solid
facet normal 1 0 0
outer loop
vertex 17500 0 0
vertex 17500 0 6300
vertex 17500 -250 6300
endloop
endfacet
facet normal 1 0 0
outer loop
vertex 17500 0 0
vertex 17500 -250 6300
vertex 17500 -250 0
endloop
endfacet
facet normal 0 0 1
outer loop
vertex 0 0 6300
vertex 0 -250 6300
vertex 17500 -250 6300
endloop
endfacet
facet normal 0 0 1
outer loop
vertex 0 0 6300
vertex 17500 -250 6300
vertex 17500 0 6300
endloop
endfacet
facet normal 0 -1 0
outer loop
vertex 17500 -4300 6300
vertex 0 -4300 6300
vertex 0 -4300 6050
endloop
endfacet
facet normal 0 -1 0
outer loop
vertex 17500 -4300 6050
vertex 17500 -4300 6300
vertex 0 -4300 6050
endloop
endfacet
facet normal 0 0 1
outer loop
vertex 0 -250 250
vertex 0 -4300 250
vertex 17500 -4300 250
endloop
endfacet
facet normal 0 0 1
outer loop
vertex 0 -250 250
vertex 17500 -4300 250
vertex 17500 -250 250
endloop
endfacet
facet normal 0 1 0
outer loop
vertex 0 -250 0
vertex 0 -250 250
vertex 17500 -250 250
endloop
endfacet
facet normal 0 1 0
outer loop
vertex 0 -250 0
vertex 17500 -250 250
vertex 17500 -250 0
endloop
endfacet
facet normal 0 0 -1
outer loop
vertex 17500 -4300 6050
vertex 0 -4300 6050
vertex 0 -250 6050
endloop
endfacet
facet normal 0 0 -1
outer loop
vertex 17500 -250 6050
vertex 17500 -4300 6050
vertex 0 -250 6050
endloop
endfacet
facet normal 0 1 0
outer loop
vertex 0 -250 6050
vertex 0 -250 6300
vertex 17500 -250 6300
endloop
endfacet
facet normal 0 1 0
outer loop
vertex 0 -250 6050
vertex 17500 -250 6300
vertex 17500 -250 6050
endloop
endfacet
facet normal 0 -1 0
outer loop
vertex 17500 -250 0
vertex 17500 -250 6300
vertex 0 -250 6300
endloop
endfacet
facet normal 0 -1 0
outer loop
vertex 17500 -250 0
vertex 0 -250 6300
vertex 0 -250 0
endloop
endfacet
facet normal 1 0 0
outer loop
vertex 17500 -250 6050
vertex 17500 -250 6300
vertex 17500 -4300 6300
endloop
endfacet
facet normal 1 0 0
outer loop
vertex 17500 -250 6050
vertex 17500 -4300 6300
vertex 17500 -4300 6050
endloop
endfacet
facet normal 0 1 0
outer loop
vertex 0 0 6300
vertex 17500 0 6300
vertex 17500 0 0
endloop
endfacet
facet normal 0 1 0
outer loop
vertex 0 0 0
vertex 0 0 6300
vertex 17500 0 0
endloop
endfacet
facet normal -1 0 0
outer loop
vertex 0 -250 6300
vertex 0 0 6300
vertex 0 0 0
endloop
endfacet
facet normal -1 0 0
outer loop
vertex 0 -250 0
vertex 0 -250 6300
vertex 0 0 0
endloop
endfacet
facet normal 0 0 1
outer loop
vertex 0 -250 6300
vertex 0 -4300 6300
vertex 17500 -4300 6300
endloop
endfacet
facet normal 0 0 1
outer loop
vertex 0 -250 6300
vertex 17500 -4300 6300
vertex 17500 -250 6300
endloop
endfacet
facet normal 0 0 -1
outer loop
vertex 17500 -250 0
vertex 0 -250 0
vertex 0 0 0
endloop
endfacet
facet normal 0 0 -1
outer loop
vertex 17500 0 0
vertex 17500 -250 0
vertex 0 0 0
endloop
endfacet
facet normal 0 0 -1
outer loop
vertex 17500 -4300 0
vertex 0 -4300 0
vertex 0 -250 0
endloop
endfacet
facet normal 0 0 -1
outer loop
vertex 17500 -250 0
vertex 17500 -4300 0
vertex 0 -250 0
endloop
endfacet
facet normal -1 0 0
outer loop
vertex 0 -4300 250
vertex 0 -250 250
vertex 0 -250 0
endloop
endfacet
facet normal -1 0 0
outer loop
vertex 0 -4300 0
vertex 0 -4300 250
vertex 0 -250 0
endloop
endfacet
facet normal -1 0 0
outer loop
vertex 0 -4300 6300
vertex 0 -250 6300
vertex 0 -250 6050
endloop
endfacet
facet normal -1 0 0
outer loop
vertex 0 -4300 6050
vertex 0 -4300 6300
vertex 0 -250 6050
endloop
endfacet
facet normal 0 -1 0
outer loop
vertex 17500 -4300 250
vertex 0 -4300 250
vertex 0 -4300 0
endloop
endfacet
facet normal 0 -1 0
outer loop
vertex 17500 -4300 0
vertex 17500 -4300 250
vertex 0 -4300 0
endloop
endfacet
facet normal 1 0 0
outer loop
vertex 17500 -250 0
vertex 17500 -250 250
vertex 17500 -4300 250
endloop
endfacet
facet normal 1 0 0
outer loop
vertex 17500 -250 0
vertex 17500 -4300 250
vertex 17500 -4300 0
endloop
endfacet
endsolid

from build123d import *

# Parameters (mm, degrees)
SKETCH4_W           = 6300
SKETCH4_H           = 250
BOSS_EXTRUDE4_DEPTH = 17500
SKETCH6_W           = 250
SKETCH6_H           = 4050
BOSS_EXTRUDE5_DEPTH = 17500
SKETCH7_W           = 250
SKETCH7_H           = 4050
BOSS_EXTRUDE6_DEPTH = 17500


with BuildPart() as part:
    # Sketch4 → Boss-Extrude4 (new body)
    with BuildSketch(Plane(origin=(0, 0, 0), x_dir=(0, 0, -1), z_dir=(1, 0, 0))):
        with Locations((-3150, -125)):
            Rectangle(SKETCH4_W, SKETCH4_H)
    extrude(amount=BOSS_EXTRUDE4_DEPTH)


with BuildPart() as body_2:
    # Sketch6 → Boss-Extrude5 (new body)
    with BuildSketch(Plane(origin=(0, 0, 0), x_dir=(0, 0, -1), z_dir=(1, 0, 0))):
        with Locations((-6175, -2275)):
            Rectangle(SKETCH6_W, SKETCH6_H)
    extrude(amount=BOSS_EXTRUDE5_DEPTH)


with BuildPart() as body_3:
    # Sketch7 → Boss-Extrude6 (new body)
    with BuildSketch(Plane(origin=(0, 0, 0), x_dir=(0, 0, -1), z_dir=(1, 0, 0))):
        with Locations((-125, -2275)):
            Rectangle(SKETCH7_W, SKETCH7_H)
    extrude(amount=BOSS_EXTRUDE6_DEPTH)


solid = Compound([part.part, body_2.part, body_3.part])
